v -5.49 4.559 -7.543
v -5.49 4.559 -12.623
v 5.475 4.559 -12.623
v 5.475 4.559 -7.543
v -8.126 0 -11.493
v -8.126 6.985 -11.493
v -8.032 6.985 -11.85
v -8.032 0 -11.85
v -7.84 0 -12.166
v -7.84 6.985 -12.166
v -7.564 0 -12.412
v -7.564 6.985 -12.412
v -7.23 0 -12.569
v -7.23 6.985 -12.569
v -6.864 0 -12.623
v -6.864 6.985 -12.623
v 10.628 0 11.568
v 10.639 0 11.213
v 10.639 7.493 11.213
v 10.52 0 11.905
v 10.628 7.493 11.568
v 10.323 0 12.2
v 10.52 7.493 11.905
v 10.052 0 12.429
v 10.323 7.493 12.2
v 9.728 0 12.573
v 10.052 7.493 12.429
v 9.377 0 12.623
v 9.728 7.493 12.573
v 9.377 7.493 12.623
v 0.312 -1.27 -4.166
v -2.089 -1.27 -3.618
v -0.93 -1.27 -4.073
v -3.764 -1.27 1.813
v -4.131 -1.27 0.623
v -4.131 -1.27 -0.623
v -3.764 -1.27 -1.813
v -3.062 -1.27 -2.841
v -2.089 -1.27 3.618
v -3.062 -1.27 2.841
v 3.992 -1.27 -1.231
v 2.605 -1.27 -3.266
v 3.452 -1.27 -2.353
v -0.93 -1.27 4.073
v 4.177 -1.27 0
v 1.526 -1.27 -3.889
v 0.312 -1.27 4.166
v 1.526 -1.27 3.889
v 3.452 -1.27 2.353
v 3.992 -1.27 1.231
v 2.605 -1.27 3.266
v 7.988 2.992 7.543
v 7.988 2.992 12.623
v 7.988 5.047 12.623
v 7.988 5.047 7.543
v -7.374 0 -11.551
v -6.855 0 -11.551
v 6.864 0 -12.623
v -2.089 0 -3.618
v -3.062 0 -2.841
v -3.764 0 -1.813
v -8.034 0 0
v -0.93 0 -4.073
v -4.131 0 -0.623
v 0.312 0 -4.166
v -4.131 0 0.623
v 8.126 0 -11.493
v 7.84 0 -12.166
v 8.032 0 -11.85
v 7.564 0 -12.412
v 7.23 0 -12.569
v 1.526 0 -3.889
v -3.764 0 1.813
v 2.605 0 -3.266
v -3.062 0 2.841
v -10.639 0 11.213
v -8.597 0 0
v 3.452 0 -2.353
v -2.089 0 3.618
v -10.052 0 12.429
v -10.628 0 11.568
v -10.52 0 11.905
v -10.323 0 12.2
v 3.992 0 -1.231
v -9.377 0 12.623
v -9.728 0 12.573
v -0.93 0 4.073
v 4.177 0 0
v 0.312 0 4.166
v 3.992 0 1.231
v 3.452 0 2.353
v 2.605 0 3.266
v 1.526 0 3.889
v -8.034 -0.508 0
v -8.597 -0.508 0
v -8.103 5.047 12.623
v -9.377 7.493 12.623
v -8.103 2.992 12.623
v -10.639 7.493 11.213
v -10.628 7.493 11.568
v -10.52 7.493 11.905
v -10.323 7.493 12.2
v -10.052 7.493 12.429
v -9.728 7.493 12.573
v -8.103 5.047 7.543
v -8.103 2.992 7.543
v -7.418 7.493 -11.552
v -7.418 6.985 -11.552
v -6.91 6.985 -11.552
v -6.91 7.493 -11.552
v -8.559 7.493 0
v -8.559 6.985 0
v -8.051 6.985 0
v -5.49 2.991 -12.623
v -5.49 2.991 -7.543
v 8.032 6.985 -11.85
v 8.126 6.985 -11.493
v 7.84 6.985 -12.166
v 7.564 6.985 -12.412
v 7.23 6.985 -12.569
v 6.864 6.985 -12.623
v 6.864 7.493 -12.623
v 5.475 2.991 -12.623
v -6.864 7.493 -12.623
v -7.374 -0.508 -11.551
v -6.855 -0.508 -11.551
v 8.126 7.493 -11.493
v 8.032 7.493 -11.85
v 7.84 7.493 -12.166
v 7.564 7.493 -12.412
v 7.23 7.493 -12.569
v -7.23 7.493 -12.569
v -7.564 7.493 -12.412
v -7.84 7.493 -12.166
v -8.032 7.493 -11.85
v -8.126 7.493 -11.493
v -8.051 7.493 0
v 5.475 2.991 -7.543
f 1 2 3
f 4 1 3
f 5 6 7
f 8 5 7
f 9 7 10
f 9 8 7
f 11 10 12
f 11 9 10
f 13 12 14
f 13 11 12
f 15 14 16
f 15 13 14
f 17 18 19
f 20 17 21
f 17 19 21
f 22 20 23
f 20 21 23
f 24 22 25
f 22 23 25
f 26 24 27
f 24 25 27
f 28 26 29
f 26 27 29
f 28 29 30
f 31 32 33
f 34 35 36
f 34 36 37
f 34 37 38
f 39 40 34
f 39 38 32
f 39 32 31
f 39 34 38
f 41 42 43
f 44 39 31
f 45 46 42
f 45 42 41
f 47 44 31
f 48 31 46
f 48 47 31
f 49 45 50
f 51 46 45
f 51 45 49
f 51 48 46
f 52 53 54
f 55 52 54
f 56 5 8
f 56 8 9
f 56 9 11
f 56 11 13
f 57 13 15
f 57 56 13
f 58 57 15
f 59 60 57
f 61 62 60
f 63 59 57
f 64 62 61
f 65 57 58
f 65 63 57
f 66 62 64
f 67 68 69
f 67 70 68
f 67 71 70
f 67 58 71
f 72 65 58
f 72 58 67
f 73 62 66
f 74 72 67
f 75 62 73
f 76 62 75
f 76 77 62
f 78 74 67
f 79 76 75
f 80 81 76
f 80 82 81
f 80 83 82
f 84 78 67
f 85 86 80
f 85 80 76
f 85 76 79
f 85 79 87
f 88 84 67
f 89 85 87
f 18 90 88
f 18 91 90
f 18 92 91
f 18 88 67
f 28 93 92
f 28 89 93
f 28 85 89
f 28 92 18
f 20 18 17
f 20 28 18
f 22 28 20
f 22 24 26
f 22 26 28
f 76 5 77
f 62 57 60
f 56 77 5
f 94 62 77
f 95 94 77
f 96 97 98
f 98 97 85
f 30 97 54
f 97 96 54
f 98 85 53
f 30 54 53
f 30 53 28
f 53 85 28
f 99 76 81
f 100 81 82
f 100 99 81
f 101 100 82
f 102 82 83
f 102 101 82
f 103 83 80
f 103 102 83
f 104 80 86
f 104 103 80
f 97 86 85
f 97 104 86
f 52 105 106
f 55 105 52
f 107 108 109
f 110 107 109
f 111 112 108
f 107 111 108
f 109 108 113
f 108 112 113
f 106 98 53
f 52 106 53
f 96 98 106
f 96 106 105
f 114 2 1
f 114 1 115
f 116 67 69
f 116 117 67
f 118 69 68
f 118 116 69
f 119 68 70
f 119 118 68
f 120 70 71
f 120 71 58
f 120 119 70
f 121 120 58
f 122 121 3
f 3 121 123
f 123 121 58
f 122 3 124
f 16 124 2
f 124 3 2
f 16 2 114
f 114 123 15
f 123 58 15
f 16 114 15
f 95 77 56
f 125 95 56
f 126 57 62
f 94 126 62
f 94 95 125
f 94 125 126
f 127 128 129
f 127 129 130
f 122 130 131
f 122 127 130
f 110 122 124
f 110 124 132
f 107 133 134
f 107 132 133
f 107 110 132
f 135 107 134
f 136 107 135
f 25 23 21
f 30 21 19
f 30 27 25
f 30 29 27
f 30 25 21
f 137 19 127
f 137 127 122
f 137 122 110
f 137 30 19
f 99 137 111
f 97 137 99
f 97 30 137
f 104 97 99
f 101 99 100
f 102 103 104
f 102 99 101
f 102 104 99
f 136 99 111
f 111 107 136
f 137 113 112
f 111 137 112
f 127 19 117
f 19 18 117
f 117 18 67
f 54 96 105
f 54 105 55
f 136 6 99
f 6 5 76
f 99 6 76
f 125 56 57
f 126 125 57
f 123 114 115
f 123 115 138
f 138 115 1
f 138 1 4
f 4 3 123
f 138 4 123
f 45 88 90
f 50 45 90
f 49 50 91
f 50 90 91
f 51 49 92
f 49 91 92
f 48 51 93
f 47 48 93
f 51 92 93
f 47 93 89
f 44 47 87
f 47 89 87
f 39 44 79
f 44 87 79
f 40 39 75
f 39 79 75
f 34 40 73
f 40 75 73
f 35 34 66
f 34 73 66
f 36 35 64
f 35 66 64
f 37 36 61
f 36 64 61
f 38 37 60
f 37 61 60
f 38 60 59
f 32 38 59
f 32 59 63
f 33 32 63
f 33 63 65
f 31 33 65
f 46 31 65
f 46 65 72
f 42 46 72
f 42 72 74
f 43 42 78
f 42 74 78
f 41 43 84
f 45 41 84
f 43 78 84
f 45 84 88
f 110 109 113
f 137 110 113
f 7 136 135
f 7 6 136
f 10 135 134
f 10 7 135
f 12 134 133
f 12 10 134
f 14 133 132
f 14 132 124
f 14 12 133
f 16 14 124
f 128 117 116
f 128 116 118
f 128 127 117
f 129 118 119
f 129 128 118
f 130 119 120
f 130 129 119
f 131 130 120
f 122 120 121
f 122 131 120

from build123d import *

# Parameters (mm, degrees)
F1_DEPTH   = 6.985
F2_R       = 4.1774350827
F3_DEPTH   = 1.27
F6_DEPTH   = 0.508
F8_DEPTH   = 0.508
F9_R       = 1.27
F10_W      = 16.0917048343
F10_H      = 2.0555099472
F8_FACE1_W = 13.7275979897
F8_FACE1_H = 7.493
F11_DEPTH  = 5.08
F12_W      = 10.965348687
F12_H      = 1.5682033263
F13_DEPTH  = 5.08


# Not quite as in the source:
# - a feature names something its author has since deleted; it is built from what else it names


with BuildPart() as f1:
    # F0 (on Front) → F1 (new body)
    with BuildSketch(Plane.XZ):
        Polygon((10.795, 12.6229311572), (-10.795, 12.6229311572), (-8.001, -12.6229311572), (8.001, -12.6229311572), align=None)
    extrude(amount=-F1_DEPTH)

    # F2 (on face) → F3 (join)
    with BuildSketch(Plane.XZ):
        Circle(F2_R)
    extrude(amount=F3_DEPTH)

    # F5 (on face) + F1_face1 (on face) → F6 (join)
    with BuildSketch(Plane.XZ):
        Polygon((-8.0337325091, 0), (-8.597294162, 0), (-7.3735090208, -11.5506481379), (-6.855092685, -11.5506481379), align=None)
    with BuildSketch(Plane(origin=(0, 6.985, 0.6254605528), x_dir=(1, 0, 0), z_dir=(0, 1, 0))):
        Polygon((-10.795, -11.9974706044), (10.795, -11.9974706044), (8.001, 13.2483917101), (-8.001, 13.2483917101), align=None)
    extrude(amount=F6_DEPTH, dir=(0, -1, 0))

    # F7 (on face) → F8 (join)
    with BuildSketch(Plane(origin=(0, 6.985, 0), x_dir=(-1, 0, 0), z_dir=(0, 1, 0))):
        Polygon((8.001, -12.6229311572), (10.795, 12.6229311572), (-10.795, 12.6229311572), (-8.001, -12.6229311572), align=None)
        Polygon((8.051493348, 0), (8.559493348, 0), (7.418411777, -11.551577974), (6.910411777, -11.551577974), align=None, mode=Mode.SUBTRACT)
    extrude(amount=F8_DEPTH)

    # F9
    f9_edges = [f1.edges().sort_by_distance(p)[0] for p in [
        (-10.795, 3.7465, 12.622931),
        (10.795, 3.7465, 12.622931),
        (8.001, 3.7465, -12.622931),
        (-8.001, 3.7465, -12.622931),
    ]]
    fillet(f9_edges, radius=F9_R)

    # F10 (on face) + F8_face1 (on face) → F11 (cut)
    with BuildSketch(Plane.XY.offset(12.6229311572)):
        with Locations((-0.0573594589, 4.0197446942)):
            Rectangle(F10_W, F10_H)
    with BuildSketch(Plane(origin=(0, 3.7465, -12.6229311572), x_dir=(1, 0, 0), z_dir=(0, 0, -1))):
        Rectangle(F8_FACE1_W, F8_FACE1_H)
    extrude(amount=-F11_DEPTH, dir=(0, 0, 1), mode=Mode.SUBTRACT)

    # F12 (on face) → F13 (cut)
    with BuildSketch(Plane(origin=(0, 0, -12.6229311572), x_dir=(1, 0, 0), z_dir=(0, 0, -1))):
        with Locations((-0.0077148434, -3.7751414347)):
            Rectangle(F12_W, F12_H)
    extrude(amount=-F13_DEPTH, mode=Mode.SUBTRACT)


solid = f1.part
